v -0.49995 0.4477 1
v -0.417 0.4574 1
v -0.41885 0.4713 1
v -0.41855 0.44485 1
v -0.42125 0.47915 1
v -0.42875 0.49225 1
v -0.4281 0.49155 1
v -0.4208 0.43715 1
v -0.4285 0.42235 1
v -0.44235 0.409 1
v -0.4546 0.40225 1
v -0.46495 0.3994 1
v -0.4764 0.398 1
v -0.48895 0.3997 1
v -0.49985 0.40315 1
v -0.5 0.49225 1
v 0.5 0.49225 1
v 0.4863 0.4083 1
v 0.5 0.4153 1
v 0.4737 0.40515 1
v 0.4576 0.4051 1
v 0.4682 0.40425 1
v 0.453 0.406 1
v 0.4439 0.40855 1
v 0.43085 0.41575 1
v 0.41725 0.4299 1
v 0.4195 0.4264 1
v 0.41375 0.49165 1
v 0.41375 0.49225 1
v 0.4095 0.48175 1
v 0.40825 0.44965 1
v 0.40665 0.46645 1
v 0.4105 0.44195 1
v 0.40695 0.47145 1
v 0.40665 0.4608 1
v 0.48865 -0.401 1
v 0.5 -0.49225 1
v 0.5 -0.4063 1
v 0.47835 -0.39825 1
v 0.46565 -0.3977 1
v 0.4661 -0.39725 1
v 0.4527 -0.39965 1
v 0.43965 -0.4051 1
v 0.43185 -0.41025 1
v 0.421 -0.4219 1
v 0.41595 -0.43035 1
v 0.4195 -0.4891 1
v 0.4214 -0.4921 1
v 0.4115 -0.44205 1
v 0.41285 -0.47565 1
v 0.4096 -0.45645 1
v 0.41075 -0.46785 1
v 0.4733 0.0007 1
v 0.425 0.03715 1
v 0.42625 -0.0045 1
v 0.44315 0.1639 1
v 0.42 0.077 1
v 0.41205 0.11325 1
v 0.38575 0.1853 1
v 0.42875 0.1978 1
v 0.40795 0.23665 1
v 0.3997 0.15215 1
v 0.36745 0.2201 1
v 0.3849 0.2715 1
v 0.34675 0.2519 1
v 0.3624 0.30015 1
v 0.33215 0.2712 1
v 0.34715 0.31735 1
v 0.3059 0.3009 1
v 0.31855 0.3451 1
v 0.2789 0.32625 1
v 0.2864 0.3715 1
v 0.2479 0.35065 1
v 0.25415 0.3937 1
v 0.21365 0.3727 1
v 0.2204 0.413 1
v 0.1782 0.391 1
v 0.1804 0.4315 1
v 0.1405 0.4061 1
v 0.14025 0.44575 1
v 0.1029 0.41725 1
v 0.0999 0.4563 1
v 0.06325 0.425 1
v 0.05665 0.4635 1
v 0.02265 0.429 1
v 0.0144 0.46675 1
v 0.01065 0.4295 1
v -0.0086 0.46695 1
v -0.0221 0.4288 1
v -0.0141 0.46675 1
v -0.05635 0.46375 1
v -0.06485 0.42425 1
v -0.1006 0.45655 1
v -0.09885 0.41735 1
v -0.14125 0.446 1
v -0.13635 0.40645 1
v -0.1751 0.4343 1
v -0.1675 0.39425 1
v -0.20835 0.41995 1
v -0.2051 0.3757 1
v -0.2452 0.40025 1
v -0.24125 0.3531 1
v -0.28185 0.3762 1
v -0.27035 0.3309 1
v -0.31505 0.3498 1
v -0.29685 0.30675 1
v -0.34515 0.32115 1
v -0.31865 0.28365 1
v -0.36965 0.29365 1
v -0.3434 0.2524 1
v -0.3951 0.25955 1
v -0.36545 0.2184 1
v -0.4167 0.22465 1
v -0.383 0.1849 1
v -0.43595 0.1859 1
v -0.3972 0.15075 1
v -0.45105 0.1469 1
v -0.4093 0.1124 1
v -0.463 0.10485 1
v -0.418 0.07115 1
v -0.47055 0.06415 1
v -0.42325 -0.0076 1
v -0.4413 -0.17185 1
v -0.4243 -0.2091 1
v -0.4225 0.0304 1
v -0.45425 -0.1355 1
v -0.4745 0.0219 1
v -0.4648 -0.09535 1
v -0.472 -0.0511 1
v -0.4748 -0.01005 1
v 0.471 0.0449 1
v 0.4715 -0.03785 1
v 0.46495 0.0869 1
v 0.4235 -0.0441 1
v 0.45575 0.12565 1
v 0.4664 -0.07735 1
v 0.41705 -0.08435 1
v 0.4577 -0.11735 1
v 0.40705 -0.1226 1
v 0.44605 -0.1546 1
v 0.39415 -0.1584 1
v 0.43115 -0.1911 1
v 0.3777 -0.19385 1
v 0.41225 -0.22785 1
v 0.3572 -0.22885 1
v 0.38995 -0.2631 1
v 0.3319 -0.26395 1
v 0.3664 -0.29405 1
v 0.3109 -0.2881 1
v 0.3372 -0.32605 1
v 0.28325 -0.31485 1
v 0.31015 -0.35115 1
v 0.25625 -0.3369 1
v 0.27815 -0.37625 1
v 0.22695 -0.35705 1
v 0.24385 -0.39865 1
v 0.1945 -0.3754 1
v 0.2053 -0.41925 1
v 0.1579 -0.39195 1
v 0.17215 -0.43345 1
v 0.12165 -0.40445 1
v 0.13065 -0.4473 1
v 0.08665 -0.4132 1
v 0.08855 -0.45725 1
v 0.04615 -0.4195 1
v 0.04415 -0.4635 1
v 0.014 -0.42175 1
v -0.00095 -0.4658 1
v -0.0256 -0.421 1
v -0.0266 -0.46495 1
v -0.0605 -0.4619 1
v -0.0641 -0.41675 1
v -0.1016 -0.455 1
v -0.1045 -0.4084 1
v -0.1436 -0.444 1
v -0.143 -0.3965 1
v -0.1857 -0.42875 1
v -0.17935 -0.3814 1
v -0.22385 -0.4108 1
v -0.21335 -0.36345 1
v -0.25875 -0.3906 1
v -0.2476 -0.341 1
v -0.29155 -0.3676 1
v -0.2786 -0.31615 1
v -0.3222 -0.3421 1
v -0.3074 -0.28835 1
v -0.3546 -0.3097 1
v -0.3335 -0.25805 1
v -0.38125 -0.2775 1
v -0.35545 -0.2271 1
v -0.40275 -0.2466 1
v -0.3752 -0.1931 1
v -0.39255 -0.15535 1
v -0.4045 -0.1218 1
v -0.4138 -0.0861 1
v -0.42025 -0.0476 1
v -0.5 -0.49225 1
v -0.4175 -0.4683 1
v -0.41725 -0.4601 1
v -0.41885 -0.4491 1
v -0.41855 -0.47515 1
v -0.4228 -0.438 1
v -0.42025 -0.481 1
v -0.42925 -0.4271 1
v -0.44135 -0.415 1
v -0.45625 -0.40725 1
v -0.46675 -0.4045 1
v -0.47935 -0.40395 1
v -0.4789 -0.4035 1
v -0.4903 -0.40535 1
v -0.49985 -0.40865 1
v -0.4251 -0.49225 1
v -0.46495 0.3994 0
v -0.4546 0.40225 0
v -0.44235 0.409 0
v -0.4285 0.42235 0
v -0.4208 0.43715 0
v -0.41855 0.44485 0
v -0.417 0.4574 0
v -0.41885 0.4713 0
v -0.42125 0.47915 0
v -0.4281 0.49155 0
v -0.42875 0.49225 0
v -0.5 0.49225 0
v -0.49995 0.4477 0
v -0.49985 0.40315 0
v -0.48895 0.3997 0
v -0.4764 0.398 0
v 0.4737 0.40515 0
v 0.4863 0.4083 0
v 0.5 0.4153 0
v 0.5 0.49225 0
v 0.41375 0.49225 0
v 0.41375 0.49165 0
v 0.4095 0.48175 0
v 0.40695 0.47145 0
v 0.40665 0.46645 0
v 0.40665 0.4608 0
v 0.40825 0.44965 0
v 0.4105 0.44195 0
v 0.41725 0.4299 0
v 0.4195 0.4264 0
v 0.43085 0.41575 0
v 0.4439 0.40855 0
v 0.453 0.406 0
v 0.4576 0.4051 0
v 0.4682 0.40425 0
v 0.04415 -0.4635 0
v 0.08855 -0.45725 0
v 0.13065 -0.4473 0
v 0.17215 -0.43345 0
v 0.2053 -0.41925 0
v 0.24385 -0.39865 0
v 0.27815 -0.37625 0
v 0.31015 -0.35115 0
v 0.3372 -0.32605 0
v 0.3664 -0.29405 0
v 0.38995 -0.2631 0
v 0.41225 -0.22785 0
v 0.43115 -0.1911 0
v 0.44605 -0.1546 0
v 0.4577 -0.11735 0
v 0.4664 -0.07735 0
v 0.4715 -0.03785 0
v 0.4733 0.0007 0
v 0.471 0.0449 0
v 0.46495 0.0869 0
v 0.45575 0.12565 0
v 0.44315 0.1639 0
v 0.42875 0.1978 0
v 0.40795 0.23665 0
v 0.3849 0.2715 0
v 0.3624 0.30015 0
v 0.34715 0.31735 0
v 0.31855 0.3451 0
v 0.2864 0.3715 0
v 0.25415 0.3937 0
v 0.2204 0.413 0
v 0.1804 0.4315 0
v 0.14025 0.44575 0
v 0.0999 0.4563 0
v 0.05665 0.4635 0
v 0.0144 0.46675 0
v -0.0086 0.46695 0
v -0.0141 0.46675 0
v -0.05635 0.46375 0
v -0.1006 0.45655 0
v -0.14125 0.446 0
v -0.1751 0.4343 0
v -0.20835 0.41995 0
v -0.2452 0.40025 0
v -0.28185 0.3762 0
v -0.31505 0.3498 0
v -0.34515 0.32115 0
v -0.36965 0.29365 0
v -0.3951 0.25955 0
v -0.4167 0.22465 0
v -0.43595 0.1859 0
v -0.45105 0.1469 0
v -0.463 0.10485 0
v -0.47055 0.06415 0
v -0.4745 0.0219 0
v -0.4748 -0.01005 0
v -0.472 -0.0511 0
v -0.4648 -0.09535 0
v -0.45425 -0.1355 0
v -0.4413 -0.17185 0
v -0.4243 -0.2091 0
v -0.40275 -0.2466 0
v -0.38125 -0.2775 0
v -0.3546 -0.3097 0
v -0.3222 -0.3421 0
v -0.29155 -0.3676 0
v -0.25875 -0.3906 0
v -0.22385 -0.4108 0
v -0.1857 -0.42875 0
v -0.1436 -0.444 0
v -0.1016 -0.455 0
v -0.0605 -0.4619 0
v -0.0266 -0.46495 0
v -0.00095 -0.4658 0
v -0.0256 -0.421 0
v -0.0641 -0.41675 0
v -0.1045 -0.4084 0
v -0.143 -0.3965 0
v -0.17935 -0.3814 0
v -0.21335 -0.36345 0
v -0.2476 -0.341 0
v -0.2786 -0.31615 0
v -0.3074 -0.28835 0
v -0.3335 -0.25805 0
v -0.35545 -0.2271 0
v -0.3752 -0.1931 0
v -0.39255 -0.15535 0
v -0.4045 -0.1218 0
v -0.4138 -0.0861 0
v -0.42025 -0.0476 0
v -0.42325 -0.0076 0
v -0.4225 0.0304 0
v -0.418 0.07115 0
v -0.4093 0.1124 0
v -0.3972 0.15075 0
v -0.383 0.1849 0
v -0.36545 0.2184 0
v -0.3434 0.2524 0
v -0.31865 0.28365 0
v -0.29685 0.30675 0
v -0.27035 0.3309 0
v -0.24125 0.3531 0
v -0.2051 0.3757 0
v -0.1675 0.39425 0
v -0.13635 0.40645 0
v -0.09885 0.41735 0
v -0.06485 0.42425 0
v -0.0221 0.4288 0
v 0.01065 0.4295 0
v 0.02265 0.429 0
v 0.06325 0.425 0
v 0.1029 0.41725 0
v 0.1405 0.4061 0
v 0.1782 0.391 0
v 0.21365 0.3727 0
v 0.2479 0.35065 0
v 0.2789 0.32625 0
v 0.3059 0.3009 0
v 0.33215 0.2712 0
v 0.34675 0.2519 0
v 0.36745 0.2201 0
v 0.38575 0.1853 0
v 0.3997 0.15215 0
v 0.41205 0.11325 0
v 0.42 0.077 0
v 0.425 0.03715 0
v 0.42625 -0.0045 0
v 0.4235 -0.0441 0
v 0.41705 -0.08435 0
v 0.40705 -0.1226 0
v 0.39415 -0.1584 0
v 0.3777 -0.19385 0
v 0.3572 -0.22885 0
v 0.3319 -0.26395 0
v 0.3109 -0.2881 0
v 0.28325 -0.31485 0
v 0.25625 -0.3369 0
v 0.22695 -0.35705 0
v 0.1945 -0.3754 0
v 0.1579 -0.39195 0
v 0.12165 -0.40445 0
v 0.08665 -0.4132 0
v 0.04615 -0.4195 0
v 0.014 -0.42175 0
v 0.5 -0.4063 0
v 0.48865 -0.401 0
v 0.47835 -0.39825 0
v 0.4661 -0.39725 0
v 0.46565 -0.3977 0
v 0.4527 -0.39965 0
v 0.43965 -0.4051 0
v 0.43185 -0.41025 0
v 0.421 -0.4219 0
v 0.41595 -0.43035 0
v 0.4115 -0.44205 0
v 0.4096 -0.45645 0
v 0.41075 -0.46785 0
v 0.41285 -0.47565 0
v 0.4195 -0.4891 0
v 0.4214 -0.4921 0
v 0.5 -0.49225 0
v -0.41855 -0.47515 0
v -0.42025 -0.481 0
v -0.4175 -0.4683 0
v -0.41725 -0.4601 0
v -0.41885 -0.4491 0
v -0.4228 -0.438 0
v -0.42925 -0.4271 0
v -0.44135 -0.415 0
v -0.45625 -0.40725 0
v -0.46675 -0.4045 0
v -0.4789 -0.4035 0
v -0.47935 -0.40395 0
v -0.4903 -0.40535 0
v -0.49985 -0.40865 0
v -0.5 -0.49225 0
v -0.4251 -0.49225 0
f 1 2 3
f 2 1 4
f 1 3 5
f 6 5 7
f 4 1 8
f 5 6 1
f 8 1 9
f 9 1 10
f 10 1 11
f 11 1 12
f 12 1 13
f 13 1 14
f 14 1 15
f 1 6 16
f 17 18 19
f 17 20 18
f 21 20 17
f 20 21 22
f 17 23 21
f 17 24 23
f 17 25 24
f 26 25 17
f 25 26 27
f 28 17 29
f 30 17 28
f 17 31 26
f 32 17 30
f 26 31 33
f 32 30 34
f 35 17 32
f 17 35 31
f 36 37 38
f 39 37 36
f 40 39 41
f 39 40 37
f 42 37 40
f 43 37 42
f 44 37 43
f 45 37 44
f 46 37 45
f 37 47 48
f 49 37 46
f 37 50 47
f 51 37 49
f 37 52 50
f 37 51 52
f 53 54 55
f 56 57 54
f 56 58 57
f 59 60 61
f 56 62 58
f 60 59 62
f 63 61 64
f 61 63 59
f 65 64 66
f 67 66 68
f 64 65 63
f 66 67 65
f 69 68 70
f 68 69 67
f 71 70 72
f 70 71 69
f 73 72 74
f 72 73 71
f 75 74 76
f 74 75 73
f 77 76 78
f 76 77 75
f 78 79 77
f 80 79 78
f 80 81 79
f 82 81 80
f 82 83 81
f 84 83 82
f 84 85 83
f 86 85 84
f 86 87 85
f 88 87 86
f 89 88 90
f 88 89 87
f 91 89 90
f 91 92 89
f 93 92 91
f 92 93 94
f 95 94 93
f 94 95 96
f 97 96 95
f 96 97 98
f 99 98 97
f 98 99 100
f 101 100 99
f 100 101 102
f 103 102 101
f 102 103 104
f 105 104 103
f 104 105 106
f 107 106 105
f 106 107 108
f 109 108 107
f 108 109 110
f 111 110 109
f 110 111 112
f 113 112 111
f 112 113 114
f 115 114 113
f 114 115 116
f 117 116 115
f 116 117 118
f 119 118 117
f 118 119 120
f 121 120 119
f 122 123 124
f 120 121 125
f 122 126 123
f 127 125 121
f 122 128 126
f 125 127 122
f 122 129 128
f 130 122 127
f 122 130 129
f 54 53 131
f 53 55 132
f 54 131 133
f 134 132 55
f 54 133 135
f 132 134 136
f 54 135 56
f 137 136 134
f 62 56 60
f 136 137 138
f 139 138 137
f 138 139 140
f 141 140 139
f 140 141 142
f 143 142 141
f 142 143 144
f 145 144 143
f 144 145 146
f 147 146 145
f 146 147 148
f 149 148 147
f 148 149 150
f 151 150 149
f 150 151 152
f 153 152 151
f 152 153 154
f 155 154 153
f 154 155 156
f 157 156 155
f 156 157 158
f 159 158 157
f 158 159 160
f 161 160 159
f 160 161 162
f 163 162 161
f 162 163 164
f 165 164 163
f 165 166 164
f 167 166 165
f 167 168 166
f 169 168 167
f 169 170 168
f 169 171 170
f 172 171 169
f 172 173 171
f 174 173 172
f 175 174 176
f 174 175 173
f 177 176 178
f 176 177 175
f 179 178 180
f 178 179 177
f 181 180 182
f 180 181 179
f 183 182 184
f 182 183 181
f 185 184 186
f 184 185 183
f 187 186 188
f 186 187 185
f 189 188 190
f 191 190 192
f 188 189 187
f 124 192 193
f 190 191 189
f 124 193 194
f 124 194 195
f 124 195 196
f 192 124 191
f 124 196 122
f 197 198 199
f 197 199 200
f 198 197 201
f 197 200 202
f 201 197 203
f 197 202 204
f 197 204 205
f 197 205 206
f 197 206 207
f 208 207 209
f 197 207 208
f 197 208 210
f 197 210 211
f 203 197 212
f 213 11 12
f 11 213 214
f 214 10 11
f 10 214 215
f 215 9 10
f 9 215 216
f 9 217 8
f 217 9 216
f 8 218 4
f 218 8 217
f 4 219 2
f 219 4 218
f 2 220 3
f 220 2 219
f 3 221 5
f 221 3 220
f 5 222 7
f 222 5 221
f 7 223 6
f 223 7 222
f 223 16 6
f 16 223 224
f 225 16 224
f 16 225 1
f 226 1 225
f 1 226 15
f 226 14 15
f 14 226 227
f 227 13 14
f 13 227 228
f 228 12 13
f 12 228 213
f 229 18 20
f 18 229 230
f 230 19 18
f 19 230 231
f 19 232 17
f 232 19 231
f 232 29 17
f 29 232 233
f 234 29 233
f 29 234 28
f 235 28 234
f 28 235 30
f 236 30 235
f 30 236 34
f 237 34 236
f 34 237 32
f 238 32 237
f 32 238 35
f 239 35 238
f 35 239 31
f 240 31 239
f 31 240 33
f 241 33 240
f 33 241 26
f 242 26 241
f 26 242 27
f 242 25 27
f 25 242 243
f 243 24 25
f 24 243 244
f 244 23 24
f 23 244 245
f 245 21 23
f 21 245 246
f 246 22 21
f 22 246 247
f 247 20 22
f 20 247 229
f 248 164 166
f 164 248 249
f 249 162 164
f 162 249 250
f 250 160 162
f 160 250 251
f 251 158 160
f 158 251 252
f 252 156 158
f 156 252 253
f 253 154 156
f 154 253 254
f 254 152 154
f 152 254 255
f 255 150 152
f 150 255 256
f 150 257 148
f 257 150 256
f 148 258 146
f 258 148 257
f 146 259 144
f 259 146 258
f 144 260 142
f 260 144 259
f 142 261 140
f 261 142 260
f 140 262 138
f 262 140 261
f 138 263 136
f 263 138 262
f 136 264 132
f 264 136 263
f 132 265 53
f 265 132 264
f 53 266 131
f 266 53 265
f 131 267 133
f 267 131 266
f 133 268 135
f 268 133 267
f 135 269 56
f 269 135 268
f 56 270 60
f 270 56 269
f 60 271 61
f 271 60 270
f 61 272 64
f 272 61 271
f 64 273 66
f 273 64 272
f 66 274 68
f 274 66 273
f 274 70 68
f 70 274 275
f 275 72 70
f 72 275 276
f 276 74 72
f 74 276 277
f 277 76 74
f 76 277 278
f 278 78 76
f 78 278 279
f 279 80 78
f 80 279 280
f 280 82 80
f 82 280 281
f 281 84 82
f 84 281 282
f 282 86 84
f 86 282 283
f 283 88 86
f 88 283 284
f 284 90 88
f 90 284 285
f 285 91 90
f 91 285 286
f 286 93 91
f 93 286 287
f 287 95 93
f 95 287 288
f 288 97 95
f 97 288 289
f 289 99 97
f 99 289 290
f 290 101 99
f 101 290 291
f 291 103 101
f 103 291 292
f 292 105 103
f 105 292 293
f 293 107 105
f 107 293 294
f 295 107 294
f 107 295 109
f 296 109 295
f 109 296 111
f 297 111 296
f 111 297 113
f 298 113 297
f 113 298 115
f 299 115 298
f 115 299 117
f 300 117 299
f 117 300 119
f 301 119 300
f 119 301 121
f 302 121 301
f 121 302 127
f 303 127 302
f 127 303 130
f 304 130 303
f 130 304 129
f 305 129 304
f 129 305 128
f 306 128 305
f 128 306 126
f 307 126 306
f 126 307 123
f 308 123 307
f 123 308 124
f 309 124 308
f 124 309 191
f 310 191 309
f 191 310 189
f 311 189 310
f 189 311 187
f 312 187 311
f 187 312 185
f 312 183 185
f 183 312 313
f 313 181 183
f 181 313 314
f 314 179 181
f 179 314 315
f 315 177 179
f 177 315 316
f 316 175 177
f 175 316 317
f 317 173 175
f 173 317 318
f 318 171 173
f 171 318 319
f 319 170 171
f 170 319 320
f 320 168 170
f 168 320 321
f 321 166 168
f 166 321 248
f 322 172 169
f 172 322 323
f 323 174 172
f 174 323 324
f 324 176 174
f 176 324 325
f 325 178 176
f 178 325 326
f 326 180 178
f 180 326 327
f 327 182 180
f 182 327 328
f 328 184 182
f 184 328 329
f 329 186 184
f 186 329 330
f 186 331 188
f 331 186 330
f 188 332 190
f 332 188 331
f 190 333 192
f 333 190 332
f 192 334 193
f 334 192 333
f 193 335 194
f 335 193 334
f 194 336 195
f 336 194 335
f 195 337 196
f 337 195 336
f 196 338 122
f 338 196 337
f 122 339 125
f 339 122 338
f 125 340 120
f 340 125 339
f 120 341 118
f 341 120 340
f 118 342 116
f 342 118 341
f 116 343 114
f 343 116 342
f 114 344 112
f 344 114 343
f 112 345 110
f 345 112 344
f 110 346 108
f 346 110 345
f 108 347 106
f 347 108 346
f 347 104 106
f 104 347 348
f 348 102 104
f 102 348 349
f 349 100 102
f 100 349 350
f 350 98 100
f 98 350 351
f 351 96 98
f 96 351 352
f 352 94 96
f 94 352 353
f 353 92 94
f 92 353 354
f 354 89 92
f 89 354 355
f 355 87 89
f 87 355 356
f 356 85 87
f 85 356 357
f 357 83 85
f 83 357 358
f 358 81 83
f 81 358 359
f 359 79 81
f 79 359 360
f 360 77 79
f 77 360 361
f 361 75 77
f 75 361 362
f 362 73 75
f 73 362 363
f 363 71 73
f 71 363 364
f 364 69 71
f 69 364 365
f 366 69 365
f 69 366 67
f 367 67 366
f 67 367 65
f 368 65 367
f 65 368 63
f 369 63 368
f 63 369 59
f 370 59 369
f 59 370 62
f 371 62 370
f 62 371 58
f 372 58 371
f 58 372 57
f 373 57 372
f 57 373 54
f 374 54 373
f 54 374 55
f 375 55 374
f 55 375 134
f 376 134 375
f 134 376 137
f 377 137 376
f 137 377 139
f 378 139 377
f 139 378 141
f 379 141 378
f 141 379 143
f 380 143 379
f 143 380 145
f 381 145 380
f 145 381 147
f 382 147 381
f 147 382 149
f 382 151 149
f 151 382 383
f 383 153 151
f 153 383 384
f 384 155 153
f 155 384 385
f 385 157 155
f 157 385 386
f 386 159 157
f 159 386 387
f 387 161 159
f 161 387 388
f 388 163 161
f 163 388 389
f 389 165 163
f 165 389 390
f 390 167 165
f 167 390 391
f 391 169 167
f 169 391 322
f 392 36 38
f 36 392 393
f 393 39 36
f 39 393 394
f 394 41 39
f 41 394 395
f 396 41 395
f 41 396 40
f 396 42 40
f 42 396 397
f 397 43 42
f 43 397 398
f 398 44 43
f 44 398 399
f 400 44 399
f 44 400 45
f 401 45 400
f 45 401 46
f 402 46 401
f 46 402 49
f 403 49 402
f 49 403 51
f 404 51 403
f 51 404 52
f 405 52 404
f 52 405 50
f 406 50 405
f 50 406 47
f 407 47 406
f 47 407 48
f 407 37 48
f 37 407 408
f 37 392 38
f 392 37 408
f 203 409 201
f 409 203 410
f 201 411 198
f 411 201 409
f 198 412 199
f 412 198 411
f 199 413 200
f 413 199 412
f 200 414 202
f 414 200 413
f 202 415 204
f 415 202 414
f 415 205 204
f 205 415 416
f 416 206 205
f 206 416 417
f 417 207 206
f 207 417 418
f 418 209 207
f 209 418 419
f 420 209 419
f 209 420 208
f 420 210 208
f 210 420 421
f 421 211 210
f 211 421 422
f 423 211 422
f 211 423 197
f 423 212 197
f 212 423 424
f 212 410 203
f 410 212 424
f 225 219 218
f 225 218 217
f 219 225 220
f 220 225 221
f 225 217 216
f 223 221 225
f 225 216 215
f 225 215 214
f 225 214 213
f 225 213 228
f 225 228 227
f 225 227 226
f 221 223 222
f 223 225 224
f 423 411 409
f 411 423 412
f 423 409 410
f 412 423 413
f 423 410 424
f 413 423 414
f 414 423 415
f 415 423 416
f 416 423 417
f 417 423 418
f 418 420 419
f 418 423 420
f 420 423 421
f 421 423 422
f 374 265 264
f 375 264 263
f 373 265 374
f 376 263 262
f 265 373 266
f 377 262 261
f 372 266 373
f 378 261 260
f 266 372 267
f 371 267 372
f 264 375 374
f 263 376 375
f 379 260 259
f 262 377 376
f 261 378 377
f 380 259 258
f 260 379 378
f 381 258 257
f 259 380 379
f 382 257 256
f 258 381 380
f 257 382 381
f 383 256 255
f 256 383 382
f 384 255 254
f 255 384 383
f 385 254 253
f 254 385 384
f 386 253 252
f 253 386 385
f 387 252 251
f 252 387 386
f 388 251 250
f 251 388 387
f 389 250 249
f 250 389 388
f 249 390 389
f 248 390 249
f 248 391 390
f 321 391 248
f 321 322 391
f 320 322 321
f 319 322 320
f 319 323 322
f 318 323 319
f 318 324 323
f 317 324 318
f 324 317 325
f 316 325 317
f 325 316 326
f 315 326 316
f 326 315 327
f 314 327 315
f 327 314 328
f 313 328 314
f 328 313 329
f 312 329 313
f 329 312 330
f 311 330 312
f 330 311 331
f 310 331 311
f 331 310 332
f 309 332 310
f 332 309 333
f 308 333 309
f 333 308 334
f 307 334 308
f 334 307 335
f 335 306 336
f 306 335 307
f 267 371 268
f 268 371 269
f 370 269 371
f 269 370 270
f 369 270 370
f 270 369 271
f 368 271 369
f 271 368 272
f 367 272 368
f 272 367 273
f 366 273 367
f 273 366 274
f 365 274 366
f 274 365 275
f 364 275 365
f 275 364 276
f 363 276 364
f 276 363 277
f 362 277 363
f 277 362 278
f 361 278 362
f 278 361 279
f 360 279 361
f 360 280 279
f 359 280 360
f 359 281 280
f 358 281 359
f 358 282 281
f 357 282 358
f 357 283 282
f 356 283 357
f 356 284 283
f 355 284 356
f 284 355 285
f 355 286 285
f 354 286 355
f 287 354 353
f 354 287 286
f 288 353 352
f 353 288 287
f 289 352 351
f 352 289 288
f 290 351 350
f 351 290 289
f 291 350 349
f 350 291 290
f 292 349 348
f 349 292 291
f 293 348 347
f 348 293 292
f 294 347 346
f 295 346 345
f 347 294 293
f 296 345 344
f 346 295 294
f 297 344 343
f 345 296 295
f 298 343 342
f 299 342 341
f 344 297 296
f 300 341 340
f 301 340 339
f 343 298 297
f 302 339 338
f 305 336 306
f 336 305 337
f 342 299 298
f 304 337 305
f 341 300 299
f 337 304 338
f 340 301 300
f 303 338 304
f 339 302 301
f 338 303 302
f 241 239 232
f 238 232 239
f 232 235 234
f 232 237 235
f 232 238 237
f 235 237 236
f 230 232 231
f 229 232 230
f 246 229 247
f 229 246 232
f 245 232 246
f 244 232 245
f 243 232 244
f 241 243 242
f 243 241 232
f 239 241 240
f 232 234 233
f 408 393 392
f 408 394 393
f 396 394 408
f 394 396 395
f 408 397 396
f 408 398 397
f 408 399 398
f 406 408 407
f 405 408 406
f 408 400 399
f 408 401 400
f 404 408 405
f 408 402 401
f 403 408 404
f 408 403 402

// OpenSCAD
module CrickCoin3white_1()
{
 /* Generated by trace2scad version 20150415
    http://aggregate.org/MAKE/TRACE2SCAD/
    Optimized model has 217/2306 original points
 */
 color([0.5, 0.5, 0.5])
 assign(minx=0) /* polygon minx=0 */
 assign(miny=0) /* polygon miny=0 */
 assign(maxx=20000) /* polygon maxx=20000 */
 assign(maxy=19690) /* polygon maxy=19690 */
 assign(dx=maxx-minx)
 assign(dy=maxy-miny)
 assign(maxd=((dx>dy)?dx:dy))
 scale([1/maxd, 1/maxd, 1])
 translate([-minx-dx/2, -miny-dy/2, 0])
 linear_extrude(height=1, convexity=217)
 union() {
  union() {
   polygon([[1,18799],[3,17908],[221,17839],[472,17805],[701,17833],[908,17890],[1153,18025],[1430,18292],[1584,18588],[1629,18742],[1660,18993],[1623,19271],[1575,19428],[1438,19676],[1425,19690],[0,19690]], convexity=5);
   polygon([[18275,19684],[18275,19678],[18190,19480],[18139,19274],[18133,19174],[18133,19061],[18165,18838],[18210,18684],[18345,18443],[18390,18373],[18617,18160],[18878,18016],[19060,17965],[19152,17947],[19364,17930],[19474,17948],[19726,18011],[20000,18151],[20000,19690],[18275,19690]], convexity=7);
   union() {
    difference() {
     polygon([[9773,19182],[9718,19180],[8873,19120],[7988,18976],[7175,18765],[6498,18531],[5833,18244],[5096,17850],[4363,17369],[3699,16841],[3097,16268],[2607,15718],[2098,15036],[1666,14338],[1281,13563],[979,12783],[740,11942],[589,11128],[510,10283],[504,9644],[560,8823],[704,7938],[915,7135],[1174,6408],[1514,5663],[1945,4913],[2375,4295],[2908,3651],[3556,3003],[4169,2493],[4825,2033],[5523,1629],[6286,1270],[7128,965],[7968,745],[8790,607],[9468,546],[9981,529],[10883,575],[11771,700],[12613,899],[13443,1176],[14106,1460],[14877,1872],[15563,2320],[16203,2822],[16744,3324],[17328,3964],[17799,4583],[18245,5288],[18623,6023],[18921,6753],[19154,7498],[19328,8298],[19430,9088],[19466,9859],[19420,10743],[19299,11583],[19115,12358],[18863,13123],[18575,13801],[18159,14578],[17698,15275],[17248,15848],[16943,16192],[16371,16747],[15728,17275],[15083,17719],[14408,18105],[13608,18475],[12805,18760],[11998,18971],[11133,19115],[10288,19180],[9828,19184]], convexity=6);
     polygon([[10333,18430],[10453,18425],[11265,18345],[12058,18190],[12810,17967],[13564,17665],[14273,17299],[14958,16858],[15578,16370],[16118,15863],[16643,15269],[16935,14883],[17349,14247],[17715,13551],[17994,12888],[18241,12110],[18400,11385],[18500,10588],[18525,9755],[18470,8963],[18341,8158],[18141,7393],[17883,6677],[17554,5968],[17144,5268],[16638,4566],[16218,4083],[15665,3548],[15125,3107],[14539,2704],[13890,2337],[13158,2006],[12433,1756],[11733,1581],[10923,1455],[10280,1410],[9488,1425],[8718,1510],[7910,1677],[7140,1915],[6413,2217],[5733,2576],[5048,3025],[4428,3522],[3852,4078],[3330,4684],[2891,5303],[2496,5983],[2149,6738],[1910,7409],[1724,8123],[1595,8893],[1535,9693],[1550,10453],[1640,11268],[1814,12093],[2056,12860],[2340,13543],[2691,14213],[3132,14893],[3627,15518],[4063,15980],[4593,16463],[5175,16907],[5898,17359],[6650,17730],[7273,17974],[8023,18192],[8703,18330],[9558,18421],[10213,18435]], convexity=6);
    }
   }
   polygon([[19317,1895],[19313,1891],[19054,1852],[18793,1743],[18637,1640],[18420,1407],[18319,1238],[18230,1004],[18192,716],[18215,488],[18257,332],[18390,63],[18428,3],[20000,0],[20000,1719],[19773,1825],[19567,1880],[19322,1900]], convexity=6);
   polygon([[417,1770],[413,1766],[194,1738],[3,1672],[0,0],[1498,0],[1595,225],[1629,342],[1650,479],[1655,643],[1623,863],[1544,1085],[1415,1303],[1173,1545],[875,1700],[665,1755],[422,1775]], convexity=5);
  }
 }
}

module CrickCoin3white()
{
 /* all layers combined, scaled to within a 1mm cube */
 scale([1, 1, 1/1])
 difference() {
  union() {
   scale([1,1,2]) translate([0,0,-0.5]) CrickCoin3white_1();
  }
  translate([0,0,-2]) cube([2,2,4],center=true);
 }
}
CrickCoin3white();
